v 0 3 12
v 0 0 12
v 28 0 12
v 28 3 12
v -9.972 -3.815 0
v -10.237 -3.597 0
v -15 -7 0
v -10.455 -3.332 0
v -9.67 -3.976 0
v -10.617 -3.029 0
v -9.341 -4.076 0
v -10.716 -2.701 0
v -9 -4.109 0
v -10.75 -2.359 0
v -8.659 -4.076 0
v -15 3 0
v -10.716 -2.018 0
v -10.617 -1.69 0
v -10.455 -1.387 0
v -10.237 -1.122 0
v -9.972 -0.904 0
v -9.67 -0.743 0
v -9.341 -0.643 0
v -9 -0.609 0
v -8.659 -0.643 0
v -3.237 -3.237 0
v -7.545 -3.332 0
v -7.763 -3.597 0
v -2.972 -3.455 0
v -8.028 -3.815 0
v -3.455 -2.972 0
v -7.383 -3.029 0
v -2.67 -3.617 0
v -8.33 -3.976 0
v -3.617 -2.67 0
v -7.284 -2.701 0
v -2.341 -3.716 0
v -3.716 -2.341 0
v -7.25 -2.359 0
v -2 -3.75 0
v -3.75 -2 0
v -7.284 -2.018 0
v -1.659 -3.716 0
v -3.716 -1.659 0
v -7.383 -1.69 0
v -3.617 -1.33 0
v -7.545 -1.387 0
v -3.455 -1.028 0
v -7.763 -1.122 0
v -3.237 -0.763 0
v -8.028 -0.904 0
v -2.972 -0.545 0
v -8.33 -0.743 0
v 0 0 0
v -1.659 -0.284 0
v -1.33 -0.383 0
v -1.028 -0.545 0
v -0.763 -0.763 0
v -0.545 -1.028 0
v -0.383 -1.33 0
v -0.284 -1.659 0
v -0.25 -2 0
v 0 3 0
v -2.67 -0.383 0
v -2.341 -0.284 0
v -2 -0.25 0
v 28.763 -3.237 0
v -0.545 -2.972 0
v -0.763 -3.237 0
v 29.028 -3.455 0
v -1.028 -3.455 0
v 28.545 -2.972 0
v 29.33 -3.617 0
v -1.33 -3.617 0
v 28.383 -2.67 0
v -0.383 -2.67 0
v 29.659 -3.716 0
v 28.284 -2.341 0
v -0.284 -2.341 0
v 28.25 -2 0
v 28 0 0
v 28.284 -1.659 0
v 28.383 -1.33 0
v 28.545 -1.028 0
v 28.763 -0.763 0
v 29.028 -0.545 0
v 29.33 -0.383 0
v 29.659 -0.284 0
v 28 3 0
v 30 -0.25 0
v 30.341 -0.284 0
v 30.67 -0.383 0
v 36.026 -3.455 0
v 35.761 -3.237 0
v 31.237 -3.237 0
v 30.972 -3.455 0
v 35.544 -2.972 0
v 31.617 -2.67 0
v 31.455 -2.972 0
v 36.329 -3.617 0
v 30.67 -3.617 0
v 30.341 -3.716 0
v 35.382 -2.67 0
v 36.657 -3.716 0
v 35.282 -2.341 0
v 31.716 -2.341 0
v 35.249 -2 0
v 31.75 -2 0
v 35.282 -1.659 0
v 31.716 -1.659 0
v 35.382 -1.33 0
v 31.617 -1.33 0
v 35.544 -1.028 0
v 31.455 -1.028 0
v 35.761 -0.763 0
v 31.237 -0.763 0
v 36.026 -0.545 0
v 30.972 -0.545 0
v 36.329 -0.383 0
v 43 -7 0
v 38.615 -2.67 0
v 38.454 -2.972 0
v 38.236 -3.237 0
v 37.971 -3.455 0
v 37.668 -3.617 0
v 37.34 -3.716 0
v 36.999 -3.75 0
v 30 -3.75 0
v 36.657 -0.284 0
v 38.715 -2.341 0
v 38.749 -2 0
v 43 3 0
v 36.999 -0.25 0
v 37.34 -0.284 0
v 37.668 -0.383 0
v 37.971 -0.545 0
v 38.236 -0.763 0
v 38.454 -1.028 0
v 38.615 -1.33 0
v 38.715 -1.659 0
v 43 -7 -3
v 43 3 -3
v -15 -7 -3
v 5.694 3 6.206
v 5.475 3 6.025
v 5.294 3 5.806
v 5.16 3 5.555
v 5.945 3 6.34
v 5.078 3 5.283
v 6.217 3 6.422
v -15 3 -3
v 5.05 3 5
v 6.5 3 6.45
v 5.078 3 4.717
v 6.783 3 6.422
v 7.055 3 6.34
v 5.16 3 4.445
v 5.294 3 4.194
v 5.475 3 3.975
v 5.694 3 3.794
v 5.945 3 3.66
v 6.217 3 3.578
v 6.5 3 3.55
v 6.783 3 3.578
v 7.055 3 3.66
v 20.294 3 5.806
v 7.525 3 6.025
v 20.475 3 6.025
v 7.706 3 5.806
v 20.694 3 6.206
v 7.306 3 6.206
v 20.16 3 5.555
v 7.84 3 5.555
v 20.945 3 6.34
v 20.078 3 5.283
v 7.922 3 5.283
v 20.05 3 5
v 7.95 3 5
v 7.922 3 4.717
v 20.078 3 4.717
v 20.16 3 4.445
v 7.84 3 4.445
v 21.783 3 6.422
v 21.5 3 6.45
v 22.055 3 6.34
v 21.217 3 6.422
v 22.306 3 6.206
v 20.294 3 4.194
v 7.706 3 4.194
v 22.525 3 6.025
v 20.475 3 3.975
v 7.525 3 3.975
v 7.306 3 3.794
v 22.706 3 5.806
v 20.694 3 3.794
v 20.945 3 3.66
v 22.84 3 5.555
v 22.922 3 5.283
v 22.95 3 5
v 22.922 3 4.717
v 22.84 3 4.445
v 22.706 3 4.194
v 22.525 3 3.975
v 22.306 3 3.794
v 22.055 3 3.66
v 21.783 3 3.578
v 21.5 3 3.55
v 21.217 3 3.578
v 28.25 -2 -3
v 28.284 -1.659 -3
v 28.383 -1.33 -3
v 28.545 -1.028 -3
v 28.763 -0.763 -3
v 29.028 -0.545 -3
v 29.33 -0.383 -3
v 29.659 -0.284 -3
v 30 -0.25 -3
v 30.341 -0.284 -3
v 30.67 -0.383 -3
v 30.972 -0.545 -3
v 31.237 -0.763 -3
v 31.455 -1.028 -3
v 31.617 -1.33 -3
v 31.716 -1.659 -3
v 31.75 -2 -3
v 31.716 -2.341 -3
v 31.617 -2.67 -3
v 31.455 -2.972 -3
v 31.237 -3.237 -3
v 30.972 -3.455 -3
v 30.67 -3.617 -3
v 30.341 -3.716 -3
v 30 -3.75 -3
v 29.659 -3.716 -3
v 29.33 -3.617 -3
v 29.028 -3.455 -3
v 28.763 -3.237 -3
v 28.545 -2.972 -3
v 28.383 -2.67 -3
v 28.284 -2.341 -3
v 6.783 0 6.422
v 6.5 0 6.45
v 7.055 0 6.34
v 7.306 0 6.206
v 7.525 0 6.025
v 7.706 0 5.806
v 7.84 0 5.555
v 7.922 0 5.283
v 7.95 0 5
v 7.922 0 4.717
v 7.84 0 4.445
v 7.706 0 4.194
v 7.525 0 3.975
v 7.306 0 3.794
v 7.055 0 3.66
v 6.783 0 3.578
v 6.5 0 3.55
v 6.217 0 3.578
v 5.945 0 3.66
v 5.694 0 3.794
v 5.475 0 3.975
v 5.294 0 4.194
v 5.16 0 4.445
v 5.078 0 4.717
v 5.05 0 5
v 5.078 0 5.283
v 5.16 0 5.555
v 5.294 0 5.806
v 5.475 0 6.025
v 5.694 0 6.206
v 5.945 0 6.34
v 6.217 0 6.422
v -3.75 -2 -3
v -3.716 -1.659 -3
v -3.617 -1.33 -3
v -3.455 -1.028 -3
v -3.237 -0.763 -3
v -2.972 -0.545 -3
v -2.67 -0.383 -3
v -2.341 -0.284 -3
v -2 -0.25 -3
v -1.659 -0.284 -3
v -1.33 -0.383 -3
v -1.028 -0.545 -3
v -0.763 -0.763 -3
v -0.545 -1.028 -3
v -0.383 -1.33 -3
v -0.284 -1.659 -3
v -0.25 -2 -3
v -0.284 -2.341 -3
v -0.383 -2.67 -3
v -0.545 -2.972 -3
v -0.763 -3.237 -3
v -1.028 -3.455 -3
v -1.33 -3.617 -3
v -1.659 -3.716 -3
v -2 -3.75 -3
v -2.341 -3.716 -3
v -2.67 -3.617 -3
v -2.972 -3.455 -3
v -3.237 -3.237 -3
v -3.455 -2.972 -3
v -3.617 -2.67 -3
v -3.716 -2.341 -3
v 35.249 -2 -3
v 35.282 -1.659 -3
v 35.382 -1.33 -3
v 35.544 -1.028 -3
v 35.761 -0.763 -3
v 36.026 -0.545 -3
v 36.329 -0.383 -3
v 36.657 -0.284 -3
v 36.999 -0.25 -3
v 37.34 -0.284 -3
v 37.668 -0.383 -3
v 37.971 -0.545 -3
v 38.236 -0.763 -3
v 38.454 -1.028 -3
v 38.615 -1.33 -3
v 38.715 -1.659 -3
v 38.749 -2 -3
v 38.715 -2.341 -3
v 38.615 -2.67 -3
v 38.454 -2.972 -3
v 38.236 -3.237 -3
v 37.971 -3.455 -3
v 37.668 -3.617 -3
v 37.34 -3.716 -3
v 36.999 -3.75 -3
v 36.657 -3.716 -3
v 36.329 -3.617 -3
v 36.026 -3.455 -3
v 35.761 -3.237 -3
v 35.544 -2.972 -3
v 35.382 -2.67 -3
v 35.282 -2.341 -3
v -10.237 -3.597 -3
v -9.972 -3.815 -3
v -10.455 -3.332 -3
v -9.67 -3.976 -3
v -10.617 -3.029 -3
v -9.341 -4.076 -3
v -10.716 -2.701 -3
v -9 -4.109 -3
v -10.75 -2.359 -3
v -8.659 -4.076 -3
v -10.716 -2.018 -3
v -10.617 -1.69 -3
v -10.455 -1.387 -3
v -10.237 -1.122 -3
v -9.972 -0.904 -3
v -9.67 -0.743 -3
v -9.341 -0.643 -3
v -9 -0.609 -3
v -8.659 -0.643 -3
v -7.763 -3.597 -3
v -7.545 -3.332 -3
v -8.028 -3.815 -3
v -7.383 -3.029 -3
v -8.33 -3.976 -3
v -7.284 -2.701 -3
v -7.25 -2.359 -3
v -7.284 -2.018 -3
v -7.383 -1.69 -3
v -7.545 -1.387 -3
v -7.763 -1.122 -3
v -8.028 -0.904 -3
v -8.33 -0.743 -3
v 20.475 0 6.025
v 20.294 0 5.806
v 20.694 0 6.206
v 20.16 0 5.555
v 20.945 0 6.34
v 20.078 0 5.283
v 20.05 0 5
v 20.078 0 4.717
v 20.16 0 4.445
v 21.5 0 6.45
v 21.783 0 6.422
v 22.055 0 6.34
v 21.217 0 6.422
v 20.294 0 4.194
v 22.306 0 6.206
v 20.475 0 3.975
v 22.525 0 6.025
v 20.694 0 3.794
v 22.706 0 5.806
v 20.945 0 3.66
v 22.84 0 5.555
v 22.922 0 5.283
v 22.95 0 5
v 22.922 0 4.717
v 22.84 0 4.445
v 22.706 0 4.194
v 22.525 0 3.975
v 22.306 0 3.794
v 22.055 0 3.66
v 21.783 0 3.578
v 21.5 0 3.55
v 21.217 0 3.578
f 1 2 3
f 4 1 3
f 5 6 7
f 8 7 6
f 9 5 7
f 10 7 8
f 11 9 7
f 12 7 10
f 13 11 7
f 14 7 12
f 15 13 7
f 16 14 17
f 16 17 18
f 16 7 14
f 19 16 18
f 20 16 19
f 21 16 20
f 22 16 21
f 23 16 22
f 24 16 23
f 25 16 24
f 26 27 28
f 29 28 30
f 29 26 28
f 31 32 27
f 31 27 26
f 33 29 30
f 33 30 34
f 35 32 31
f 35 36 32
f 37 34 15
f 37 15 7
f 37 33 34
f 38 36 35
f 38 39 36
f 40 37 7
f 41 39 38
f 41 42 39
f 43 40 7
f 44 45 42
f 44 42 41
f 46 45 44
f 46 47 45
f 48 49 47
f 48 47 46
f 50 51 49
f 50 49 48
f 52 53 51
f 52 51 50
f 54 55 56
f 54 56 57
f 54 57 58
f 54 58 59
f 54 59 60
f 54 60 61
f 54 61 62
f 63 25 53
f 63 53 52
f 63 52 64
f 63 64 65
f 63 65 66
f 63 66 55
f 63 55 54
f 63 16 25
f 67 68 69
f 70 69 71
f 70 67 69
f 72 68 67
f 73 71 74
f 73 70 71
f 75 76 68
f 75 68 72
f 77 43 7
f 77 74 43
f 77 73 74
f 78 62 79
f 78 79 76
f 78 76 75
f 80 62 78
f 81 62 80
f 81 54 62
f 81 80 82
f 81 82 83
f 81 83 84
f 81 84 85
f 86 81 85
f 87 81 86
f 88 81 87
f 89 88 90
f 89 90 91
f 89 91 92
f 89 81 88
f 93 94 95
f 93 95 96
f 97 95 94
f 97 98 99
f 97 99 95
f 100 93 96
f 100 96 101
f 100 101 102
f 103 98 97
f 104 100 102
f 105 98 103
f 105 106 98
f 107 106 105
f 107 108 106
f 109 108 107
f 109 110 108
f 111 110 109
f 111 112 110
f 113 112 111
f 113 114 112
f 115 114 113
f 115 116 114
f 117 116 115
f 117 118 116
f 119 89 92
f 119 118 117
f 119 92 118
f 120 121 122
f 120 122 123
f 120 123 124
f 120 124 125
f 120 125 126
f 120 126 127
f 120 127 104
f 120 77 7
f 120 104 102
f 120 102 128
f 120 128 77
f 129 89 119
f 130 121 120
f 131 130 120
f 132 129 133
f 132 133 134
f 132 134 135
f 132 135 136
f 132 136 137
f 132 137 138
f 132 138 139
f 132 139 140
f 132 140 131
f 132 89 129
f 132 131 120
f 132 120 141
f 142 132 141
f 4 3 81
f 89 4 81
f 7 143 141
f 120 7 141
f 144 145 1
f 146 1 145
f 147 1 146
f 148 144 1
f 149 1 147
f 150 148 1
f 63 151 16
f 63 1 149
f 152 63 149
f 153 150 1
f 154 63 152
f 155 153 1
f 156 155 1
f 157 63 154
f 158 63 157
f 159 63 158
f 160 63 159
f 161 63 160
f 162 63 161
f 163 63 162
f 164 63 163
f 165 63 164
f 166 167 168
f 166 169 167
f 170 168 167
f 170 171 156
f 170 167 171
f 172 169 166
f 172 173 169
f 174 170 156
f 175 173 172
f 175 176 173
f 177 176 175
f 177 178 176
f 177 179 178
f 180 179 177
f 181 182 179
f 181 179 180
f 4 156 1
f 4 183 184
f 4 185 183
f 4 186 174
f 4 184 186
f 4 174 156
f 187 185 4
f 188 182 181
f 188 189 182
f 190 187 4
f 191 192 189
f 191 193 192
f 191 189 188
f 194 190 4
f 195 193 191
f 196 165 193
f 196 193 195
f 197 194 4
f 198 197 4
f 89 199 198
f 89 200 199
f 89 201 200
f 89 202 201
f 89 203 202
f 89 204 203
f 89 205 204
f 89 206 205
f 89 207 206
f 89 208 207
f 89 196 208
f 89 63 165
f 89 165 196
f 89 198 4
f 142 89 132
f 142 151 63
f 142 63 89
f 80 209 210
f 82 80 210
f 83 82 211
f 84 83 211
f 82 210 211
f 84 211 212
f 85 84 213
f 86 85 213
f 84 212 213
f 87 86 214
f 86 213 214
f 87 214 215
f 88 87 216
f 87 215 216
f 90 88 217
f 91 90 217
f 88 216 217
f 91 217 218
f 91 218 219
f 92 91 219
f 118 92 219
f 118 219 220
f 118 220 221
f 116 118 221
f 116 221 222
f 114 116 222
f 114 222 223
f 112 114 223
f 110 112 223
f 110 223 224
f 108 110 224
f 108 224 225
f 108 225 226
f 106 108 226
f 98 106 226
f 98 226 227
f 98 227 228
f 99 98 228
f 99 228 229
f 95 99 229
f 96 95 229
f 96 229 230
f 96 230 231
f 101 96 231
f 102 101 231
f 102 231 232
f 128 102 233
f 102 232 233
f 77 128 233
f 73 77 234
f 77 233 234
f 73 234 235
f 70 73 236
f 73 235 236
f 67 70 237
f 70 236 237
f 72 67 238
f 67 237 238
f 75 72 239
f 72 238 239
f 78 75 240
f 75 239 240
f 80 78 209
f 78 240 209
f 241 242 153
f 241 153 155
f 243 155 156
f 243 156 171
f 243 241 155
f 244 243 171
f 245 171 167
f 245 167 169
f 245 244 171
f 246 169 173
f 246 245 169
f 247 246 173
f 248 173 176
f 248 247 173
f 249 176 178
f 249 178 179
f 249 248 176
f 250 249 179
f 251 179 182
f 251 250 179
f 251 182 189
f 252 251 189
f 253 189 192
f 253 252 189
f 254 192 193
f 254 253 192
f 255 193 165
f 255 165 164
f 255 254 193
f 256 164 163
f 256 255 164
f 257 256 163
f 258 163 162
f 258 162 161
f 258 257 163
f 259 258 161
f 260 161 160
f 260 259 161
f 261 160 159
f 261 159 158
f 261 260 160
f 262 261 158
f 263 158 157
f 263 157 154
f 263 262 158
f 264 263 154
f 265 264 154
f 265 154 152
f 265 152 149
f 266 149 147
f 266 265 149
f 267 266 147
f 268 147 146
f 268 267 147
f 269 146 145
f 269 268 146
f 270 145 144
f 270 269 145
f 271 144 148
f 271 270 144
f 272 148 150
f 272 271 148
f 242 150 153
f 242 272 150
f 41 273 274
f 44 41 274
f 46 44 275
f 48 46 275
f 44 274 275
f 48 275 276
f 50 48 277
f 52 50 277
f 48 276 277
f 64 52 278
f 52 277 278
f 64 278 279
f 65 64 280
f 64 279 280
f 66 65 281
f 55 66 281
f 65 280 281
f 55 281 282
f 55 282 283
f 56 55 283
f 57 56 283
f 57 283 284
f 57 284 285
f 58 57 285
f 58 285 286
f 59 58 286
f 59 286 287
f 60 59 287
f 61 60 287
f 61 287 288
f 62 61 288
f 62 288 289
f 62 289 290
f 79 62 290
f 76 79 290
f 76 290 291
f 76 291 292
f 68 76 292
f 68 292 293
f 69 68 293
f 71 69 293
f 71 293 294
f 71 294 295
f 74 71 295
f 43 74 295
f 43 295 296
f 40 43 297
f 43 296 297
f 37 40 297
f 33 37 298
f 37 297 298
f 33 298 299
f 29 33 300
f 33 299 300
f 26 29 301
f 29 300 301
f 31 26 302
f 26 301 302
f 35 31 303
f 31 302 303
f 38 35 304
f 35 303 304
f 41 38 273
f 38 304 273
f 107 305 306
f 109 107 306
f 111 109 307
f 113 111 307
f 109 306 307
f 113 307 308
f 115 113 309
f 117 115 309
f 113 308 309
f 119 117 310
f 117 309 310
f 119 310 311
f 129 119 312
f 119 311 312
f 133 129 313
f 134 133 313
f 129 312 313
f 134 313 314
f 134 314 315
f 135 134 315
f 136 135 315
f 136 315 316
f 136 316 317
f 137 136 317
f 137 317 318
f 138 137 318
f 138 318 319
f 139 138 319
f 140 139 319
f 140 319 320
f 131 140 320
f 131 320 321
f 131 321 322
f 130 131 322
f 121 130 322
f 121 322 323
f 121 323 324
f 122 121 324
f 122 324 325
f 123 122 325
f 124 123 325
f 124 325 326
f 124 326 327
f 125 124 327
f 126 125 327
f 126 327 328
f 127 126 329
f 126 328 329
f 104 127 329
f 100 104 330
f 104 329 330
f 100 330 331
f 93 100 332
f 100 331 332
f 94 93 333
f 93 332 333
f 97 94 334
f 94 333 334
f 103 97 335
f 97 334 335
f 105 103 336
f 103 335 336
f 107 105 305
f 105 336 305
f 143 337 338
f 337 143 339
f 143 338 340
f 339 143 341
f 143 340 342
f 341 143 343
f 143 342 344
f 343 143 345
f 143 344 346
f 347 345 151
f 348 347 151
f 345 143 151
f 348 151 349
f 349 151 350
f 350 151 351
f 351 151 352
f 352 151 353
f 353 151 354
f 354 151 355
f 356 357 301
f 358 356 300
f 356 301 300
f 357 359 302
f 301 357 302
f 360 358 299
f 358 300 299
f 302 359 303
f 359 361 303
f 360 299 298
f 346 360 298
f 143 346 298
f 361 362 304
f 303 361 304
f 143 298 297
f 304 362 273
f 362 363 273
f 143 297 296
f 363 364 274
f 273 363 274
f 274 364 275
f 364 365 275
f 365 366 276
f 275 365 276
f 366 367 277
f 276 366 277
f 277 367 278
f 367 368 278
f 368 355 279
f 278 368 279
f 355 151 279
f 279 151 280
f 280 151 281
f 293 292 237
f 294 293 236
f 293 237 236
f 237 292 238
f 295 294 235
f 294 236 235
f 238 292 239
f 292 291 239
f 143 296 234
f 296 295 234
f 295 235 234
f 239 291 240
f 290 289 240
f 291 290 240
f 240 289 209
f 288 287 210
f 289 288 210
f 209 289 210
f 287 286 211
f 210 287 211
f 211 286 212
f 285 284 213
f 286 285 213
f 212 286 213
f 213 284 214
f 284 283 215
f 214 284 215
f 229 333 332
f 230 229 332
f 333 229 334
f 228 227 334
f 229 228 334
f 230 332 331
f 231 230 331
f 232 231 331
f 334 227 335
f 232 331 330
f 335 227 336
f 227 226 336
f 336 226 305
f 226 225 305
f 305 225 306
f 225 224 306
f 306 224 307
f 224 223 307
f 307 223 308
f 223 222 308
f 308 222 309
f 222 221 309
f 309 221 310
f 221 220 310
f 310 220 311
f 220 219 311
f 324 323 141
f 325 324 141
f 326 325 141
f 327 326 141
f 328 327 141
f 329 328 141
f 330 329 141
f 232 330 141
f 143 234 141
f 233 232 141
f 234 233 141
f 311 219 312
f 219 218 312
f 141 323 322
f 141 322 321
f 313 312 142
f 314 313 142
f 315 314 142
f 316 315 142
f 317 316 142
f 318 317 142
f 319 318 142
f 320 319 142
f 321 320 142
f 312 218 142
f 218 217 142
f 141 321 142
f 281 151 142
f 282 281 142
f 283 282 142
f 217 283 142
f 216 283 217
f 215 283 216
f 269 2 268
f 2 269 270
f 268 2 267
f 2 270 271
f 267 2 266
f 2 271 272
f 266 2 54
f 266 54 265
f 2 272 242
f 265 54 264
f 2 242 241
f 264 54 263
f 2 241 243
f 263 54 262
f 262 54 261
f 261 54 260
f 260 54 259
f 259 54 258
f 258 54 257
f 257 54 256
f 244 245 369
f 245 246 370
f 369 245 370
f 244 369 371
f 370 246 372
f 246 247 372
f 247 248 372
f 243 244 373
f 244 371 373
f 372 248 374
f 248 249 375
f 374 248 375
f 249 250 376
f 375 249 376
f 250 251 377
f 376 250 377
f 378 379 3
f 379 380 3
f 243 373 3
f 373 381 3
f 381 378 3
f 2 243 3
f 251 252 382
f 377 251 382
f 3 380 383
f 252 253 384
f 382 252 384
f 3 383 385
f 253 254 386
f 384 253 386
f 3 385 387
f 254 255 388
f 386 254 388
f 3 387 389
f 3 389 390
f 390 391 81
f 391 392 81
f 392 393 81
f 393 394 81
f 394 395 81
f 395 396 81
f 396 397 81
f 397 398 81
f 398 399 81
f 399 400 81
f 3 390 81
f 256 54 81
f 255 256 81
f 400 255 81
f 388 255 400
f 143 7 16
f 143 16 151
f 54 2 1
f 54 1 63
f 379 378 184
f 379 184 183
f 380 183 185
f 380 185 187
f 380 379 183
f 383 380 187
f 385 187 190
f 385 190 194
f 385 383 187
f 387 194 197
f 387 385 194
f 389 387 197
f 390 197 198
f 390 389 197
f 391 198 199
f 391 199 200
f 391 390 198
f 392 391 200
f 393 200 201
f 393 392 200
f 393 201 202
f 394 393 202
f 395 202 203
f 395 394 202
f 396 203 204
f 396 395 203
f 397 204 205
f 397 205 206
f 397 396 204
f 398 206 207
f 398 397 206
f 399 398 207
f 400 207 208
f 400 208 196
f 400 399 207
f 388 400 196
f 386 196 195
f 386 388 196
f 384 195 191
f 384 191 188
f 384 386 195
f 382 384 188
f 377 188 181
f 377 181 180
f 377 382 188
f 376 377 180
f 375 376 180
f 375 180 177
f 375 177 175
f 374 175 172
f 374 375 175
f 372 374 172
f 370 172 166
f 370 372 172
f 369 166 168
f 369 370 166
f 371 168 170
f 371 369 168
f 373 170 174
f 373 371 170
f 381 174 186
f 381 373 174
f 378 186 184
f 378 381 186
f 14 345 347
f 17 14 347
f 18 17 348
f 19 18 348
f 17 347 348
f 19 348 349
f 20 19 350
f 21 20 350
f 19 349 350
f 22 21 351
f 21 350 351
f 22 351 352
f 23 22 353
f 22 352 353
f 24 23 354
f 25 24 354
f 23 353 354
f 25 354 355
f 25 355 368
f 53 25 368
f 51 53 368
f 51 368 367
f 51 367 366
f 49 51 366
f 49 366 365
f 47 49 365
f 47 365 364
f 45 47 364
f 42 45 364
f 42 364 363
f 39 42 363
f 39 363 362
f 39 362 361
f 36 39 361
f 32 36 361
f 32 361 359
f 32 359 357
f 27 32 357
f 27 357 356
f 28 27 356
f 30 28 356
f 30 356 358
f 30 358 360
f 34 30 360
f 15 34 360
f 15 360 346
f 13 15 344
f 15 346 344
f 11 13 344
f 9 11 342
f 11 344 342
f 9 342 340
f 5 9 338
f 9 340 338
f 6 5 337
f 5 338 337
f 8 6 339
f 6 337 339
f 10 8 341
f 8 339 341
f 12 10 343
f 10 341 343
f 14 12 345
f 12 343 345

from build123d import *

# Parameters (mm, degrees)
SKETCH1_W           = 28
SKETCH1_H           = 12
SKETCH1_R           = 1.45
BOSS_EXTRUDE1_DEPTH = 3
SKETCH2_W           = 58
SKETCH2_H           = 3
BOSS_EXTRUDE2_DEPTH = 10
SKETCH3_R           = 1.75
CUT_EXTRUDE1_DEPTH  = 12


with BuildPart() as part:
    # Sketch1 → Boss-Extrude1 (new body)
    with BuildSketch(Plane(origin=(0, 0, 0), x_dir=(1, 0, 0), z_dir=(0, 1, 0))):
        with Locations((14, -6)):
            Rectangle(SKETCH1_W, SKETCH1_H)
        with Locations(Location((6.5, -5, 0), (0, 0, 270))):
            Circle(SKETCH1_R, mode=Mode.SUBTRACT)
        with Locations(Location((21.5, -5, 0), (0, 0, 270))):
            Circle(SKETCH1_R, mode=Mode.SUBTRACT)
    extrude(amount=BOSS_EXTRUDE1_DEPTH)

    # Sketch2 → Boss-Extrude2 (add)
    with BuildSketch(Plane(origin=(0, 3, 0), x_dir=(1, 0, 0), z_dir=(0, 1, 0))):
        with Locations((14, 1.5)):
            Rectangle(SKETCH2_W, SKETCH2_H)
    extrude(amount=-BOSS_EXTRUDE2_DEPTH)

    # Sketch3 → Cut-Extrude1 (cut)
    with BuildSketch(Plane(origin=(0, 0, -3), x_dir=(-1, 0, 0), z_dir=(0, 0, -1))):
        with Locations((9, -2.359486917)):
            Circle(SKETCH3_R)
        with Locations((-36.998595295, -2)):
            Circle(SKETCH3_R)
        with Locations((2, -2)):
            Circle(SKETCH3_R)
        with Locations((-30, -2)):
            Circle(SKETCH3_R)
    extrude(amount=-CUT_EXTRUDE1_DEPTH, mode=Mode.SUBTRACT)


solid = part.part
